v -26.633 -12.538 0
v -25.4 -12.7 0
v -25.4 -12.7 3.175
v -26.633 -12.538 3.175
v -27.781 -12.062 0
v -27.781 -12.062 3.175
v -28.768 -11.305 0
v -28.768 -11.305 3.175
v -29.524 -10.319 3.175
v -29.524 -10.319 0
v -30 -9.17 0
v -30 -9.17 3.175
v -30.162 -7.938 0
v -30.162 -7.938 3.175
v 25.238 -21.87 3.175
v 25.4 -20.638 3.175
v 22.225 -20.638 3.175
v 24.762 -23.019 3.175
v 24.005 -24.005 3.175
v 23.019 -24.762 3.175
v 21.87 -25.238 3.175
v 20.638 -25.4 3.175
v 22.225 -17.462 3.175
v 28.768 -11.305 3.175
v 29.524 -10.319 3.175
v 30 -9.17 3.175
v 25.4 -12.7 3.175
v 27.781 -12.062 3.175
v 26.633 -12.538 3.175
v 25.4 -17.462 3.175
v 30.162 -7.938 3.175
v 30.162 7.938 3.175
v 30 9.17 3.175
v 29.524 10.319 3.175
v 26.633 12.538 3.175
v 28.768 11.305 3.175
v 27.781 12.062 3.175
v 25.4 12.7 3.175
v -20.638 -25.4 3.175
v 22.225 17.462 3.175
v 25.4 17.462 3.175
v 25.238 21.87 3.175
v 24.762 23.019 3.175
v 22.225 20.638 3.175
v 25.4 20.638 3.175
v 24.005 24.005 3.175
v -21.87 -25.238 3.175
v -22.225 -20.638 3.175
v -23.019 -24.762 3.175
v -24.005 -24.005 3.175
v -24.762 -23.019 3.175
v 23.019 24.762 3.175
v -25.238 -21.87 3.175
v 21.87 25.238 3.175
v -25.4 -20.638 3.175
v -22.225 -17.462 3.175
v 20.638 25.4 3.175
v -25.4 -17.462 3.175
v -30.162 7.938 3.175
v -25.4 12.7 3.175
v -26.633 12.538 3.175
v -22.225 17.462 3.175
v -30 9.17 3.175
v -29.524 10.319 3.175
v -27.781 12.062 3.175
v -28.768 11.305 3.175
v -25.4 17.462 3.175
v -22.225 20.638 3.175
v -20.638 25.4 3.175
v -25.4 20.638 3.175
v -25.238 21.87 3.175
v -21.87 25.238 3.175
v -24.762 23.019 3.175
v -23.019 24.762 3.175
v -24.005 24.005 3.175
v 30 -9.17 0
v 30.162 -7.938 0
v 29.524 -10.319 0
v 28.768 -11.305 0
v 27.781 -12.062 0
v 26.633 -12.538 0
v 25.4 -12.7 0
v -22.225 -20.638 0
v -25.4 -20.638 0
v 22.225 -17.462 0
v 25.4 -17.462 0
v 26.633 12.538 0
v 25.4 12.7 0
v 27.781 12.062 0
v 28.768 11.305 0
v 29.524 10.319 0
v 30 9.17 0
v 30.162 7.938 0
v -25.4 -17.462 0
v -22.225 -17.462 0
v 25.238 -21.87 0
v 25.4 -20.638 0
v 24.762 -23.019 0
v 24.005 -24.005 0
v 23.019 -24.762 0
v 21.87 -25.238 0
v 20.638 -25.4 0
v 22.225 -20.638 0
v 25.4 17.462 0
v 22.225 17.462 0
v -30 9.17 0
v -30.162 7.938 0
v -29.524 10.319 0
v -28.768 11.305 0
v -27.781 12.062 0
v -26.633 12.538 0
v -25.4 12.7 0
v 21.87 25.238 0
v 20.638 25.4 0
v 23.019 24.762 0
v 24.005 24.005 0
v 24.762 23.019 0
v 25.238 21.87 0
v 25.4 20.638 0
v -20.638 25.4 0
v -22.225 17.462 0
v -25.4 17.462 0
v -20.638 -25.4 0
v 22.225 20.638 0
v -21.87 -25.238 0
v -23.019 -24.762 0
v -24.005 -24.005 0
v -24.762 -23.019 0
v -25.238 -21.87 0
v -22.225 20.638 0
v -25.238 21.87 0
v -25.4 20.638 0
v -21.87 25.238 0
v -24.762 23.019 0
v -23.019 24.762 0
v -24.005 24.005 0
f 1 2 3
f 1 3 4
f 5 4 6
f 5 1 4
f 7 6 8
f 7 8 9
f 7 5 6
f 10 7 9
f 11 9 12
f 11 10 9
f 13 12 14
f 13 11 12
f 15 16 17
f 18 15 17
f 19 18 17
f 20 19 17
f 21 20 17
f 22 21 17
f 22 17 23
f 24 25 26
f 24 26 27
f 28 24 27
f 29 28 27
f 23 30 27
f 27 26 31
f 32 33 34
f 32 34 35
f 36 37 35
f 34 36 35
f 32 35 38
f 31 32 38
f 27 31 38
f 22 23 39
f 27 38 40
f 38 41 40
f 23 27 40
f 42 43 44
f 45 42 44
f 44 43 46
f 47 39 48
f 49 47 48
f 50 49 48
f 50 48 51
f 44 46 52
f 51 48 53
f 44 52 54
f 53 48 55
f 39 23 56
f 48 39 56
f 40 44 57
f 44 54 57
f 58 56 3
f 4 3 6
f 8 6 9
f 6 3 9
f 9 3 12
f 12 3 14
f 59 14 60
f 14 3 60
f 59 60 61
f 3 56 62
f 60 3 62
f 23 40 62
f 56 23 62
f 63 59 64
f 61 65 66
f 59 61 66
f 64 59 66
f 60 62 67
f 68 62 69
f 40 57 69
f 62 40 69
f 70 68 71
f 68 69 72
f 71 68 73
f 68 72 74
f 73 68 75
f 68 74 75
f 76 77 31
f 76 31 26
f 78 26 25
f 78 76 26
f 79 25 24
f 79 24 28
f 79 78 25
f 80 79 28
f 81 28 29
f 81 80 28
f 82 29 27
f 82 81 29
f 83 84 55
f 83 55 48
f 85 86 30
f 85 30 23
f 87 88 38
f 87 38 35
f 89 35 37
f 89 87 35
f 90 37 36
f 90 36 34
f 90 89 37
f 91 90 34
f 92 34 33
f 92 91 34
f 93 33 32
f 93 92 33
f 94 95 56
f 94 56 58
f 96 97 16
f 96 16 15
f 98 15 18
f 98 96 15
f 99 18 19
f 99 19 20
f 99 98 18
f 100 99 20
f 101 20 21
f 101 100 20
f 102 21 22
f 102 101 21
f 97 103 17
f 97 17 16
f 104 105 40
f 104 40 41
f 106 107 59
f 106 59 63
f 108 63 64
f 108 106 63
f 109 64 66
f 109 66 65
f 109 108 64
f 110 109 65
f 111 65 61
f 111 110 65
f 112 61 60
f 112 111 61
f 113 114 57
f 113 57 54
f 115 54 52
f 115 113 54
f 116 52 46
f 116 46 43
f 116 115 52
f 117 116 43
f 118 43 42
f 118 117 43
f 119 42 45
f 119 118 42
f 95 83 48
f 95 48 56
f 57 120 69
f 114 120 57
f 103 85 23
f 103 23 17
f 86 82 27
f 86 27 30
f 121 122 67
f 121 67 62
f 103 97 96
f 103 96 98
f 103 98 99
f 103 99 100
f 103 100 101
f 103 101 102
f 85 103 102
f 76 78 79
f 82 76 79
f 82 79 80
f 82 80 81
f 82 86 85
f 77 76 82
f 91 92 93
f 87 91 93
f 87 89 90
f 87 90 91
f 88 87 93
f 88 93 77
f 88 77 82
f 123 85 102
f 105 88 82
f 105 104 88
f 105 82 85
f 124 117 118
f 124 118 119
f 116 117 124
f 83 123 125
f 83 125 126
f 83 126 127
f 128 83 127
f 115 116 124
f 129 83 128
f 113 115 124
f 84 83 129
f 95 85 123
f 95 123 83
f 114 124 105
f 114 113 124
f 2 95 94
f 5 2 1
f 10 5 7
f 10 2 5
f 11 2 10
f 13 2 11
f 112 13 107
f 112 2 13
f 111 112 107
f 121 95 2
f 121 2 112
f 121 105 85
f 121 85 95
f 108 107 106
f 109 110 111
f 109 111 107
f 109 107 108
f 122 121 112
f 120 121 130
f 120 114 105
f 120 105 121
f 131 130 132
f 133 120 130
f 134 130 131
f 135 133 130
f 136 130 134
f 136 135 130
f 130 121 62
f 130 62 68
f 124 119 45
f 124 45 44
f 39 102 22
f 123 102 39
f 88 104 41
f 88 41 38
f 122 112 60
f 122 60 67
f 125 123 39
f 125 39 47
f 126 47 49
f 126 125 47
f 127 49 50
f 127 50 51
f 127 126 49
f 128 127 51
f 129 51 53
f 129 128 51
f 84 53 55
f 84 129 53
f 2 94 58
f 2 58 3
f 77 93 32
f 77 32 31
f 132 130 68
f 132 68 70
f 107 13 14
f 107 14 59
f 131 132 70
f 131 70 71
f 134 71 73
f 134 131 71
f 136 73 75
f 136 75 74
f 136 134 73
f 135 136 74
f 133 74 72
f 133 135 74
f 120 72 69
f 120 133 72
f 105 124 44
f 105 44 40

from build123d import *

# Parameters (mm, degrees)
BOSS_EXTRUDE2_DEPTH = 3.175


with BuildPart() as part:
    # Sketch1 → Boss-Extrude2 (new body)
    with BuildSketch(Plane.XY):
        with BuildLine():
            ThreePointArc((-25.4, -12.7), (-28.767596045, -11.305096045), (-30.1625, -7.9375))
            Line((-30.1625, -7.9375), (-30.1625, 7.9375))
            ThreePointArc((-30.1625, 7.9375), (-28.767596045, 11.305096045), (-25.4, 12.7))
            Line((-25.4, 12.7), (-25.4, 17.4625))
            Line((-25.4, 17.4625), (-22.225, 17.4625))
            Line((-22.225, 17.4625), (-22.225, 20.6375))
            Line((-22.225, 20.6375), (-25.4, 20.6375))
            ThreePointArc((-25.4, 20.6375), (-24.005096045, 24.005096045), (-20.6375, 25.4))
            Line((-20.6375, 25.4), (20.6375, 25.4))
            ThreePointArc((20.6375, 25.4), (24.005096045, 24.005096045), (25.4, 20.6375))
            Line((25.4, 20.6375), (22.225, 20.6375))
            Line((22.225, 20.6375), (22.225, 17.4625))
            Line((22.225, 17.4625), (25.4, 17.4625))
            Line((25.4, 17.4625), (25.4, 12.7))
            ThreePointArc((25.4, 12.7), (28.767596045, 11.305096045), (30.1625, 7.9375))
            Line((30.1625, 7.9375), (30.1625, -7.9375))
            ThreePointArc((30.1625, -7.9375), (28.767596045, -11.305096045), (25.4, -12.7))
            Line((25.4, -12.7), (25.4, -17.4625))
            Line((25.4, -17.4625), (22.225, -17.4625))
            Line((22.225, -17.4625), (22.225, -20.6375))
            Line((22.225, -20.6375), (25.4, -20.6375))
            ThreePointArc((25.4, -20.6375), (24.005096045, -24.005096045), (20.6375, -25.4))
            Line((20.6375, -25.4), (-20.6375, -25.4))
            ThreePointArc((-20.6375, -25.4), (-24.005096045, -24.005096045), (-25.4, -20.6375))
            Line((-25.4, -20.6375), (-22.225, -20.6375))
            Line((-22.225, -20.6375), (-22.225, -17.4625))
            Line((-22.225, -17.4625), (-25.4, -17.4625))
            Line((-25.4, -17.4625), (-25.4, -12.7))
        make_face()
    extrude(amount=BOSS_EXTRUDE2_DEPTH)


solid = part.part
